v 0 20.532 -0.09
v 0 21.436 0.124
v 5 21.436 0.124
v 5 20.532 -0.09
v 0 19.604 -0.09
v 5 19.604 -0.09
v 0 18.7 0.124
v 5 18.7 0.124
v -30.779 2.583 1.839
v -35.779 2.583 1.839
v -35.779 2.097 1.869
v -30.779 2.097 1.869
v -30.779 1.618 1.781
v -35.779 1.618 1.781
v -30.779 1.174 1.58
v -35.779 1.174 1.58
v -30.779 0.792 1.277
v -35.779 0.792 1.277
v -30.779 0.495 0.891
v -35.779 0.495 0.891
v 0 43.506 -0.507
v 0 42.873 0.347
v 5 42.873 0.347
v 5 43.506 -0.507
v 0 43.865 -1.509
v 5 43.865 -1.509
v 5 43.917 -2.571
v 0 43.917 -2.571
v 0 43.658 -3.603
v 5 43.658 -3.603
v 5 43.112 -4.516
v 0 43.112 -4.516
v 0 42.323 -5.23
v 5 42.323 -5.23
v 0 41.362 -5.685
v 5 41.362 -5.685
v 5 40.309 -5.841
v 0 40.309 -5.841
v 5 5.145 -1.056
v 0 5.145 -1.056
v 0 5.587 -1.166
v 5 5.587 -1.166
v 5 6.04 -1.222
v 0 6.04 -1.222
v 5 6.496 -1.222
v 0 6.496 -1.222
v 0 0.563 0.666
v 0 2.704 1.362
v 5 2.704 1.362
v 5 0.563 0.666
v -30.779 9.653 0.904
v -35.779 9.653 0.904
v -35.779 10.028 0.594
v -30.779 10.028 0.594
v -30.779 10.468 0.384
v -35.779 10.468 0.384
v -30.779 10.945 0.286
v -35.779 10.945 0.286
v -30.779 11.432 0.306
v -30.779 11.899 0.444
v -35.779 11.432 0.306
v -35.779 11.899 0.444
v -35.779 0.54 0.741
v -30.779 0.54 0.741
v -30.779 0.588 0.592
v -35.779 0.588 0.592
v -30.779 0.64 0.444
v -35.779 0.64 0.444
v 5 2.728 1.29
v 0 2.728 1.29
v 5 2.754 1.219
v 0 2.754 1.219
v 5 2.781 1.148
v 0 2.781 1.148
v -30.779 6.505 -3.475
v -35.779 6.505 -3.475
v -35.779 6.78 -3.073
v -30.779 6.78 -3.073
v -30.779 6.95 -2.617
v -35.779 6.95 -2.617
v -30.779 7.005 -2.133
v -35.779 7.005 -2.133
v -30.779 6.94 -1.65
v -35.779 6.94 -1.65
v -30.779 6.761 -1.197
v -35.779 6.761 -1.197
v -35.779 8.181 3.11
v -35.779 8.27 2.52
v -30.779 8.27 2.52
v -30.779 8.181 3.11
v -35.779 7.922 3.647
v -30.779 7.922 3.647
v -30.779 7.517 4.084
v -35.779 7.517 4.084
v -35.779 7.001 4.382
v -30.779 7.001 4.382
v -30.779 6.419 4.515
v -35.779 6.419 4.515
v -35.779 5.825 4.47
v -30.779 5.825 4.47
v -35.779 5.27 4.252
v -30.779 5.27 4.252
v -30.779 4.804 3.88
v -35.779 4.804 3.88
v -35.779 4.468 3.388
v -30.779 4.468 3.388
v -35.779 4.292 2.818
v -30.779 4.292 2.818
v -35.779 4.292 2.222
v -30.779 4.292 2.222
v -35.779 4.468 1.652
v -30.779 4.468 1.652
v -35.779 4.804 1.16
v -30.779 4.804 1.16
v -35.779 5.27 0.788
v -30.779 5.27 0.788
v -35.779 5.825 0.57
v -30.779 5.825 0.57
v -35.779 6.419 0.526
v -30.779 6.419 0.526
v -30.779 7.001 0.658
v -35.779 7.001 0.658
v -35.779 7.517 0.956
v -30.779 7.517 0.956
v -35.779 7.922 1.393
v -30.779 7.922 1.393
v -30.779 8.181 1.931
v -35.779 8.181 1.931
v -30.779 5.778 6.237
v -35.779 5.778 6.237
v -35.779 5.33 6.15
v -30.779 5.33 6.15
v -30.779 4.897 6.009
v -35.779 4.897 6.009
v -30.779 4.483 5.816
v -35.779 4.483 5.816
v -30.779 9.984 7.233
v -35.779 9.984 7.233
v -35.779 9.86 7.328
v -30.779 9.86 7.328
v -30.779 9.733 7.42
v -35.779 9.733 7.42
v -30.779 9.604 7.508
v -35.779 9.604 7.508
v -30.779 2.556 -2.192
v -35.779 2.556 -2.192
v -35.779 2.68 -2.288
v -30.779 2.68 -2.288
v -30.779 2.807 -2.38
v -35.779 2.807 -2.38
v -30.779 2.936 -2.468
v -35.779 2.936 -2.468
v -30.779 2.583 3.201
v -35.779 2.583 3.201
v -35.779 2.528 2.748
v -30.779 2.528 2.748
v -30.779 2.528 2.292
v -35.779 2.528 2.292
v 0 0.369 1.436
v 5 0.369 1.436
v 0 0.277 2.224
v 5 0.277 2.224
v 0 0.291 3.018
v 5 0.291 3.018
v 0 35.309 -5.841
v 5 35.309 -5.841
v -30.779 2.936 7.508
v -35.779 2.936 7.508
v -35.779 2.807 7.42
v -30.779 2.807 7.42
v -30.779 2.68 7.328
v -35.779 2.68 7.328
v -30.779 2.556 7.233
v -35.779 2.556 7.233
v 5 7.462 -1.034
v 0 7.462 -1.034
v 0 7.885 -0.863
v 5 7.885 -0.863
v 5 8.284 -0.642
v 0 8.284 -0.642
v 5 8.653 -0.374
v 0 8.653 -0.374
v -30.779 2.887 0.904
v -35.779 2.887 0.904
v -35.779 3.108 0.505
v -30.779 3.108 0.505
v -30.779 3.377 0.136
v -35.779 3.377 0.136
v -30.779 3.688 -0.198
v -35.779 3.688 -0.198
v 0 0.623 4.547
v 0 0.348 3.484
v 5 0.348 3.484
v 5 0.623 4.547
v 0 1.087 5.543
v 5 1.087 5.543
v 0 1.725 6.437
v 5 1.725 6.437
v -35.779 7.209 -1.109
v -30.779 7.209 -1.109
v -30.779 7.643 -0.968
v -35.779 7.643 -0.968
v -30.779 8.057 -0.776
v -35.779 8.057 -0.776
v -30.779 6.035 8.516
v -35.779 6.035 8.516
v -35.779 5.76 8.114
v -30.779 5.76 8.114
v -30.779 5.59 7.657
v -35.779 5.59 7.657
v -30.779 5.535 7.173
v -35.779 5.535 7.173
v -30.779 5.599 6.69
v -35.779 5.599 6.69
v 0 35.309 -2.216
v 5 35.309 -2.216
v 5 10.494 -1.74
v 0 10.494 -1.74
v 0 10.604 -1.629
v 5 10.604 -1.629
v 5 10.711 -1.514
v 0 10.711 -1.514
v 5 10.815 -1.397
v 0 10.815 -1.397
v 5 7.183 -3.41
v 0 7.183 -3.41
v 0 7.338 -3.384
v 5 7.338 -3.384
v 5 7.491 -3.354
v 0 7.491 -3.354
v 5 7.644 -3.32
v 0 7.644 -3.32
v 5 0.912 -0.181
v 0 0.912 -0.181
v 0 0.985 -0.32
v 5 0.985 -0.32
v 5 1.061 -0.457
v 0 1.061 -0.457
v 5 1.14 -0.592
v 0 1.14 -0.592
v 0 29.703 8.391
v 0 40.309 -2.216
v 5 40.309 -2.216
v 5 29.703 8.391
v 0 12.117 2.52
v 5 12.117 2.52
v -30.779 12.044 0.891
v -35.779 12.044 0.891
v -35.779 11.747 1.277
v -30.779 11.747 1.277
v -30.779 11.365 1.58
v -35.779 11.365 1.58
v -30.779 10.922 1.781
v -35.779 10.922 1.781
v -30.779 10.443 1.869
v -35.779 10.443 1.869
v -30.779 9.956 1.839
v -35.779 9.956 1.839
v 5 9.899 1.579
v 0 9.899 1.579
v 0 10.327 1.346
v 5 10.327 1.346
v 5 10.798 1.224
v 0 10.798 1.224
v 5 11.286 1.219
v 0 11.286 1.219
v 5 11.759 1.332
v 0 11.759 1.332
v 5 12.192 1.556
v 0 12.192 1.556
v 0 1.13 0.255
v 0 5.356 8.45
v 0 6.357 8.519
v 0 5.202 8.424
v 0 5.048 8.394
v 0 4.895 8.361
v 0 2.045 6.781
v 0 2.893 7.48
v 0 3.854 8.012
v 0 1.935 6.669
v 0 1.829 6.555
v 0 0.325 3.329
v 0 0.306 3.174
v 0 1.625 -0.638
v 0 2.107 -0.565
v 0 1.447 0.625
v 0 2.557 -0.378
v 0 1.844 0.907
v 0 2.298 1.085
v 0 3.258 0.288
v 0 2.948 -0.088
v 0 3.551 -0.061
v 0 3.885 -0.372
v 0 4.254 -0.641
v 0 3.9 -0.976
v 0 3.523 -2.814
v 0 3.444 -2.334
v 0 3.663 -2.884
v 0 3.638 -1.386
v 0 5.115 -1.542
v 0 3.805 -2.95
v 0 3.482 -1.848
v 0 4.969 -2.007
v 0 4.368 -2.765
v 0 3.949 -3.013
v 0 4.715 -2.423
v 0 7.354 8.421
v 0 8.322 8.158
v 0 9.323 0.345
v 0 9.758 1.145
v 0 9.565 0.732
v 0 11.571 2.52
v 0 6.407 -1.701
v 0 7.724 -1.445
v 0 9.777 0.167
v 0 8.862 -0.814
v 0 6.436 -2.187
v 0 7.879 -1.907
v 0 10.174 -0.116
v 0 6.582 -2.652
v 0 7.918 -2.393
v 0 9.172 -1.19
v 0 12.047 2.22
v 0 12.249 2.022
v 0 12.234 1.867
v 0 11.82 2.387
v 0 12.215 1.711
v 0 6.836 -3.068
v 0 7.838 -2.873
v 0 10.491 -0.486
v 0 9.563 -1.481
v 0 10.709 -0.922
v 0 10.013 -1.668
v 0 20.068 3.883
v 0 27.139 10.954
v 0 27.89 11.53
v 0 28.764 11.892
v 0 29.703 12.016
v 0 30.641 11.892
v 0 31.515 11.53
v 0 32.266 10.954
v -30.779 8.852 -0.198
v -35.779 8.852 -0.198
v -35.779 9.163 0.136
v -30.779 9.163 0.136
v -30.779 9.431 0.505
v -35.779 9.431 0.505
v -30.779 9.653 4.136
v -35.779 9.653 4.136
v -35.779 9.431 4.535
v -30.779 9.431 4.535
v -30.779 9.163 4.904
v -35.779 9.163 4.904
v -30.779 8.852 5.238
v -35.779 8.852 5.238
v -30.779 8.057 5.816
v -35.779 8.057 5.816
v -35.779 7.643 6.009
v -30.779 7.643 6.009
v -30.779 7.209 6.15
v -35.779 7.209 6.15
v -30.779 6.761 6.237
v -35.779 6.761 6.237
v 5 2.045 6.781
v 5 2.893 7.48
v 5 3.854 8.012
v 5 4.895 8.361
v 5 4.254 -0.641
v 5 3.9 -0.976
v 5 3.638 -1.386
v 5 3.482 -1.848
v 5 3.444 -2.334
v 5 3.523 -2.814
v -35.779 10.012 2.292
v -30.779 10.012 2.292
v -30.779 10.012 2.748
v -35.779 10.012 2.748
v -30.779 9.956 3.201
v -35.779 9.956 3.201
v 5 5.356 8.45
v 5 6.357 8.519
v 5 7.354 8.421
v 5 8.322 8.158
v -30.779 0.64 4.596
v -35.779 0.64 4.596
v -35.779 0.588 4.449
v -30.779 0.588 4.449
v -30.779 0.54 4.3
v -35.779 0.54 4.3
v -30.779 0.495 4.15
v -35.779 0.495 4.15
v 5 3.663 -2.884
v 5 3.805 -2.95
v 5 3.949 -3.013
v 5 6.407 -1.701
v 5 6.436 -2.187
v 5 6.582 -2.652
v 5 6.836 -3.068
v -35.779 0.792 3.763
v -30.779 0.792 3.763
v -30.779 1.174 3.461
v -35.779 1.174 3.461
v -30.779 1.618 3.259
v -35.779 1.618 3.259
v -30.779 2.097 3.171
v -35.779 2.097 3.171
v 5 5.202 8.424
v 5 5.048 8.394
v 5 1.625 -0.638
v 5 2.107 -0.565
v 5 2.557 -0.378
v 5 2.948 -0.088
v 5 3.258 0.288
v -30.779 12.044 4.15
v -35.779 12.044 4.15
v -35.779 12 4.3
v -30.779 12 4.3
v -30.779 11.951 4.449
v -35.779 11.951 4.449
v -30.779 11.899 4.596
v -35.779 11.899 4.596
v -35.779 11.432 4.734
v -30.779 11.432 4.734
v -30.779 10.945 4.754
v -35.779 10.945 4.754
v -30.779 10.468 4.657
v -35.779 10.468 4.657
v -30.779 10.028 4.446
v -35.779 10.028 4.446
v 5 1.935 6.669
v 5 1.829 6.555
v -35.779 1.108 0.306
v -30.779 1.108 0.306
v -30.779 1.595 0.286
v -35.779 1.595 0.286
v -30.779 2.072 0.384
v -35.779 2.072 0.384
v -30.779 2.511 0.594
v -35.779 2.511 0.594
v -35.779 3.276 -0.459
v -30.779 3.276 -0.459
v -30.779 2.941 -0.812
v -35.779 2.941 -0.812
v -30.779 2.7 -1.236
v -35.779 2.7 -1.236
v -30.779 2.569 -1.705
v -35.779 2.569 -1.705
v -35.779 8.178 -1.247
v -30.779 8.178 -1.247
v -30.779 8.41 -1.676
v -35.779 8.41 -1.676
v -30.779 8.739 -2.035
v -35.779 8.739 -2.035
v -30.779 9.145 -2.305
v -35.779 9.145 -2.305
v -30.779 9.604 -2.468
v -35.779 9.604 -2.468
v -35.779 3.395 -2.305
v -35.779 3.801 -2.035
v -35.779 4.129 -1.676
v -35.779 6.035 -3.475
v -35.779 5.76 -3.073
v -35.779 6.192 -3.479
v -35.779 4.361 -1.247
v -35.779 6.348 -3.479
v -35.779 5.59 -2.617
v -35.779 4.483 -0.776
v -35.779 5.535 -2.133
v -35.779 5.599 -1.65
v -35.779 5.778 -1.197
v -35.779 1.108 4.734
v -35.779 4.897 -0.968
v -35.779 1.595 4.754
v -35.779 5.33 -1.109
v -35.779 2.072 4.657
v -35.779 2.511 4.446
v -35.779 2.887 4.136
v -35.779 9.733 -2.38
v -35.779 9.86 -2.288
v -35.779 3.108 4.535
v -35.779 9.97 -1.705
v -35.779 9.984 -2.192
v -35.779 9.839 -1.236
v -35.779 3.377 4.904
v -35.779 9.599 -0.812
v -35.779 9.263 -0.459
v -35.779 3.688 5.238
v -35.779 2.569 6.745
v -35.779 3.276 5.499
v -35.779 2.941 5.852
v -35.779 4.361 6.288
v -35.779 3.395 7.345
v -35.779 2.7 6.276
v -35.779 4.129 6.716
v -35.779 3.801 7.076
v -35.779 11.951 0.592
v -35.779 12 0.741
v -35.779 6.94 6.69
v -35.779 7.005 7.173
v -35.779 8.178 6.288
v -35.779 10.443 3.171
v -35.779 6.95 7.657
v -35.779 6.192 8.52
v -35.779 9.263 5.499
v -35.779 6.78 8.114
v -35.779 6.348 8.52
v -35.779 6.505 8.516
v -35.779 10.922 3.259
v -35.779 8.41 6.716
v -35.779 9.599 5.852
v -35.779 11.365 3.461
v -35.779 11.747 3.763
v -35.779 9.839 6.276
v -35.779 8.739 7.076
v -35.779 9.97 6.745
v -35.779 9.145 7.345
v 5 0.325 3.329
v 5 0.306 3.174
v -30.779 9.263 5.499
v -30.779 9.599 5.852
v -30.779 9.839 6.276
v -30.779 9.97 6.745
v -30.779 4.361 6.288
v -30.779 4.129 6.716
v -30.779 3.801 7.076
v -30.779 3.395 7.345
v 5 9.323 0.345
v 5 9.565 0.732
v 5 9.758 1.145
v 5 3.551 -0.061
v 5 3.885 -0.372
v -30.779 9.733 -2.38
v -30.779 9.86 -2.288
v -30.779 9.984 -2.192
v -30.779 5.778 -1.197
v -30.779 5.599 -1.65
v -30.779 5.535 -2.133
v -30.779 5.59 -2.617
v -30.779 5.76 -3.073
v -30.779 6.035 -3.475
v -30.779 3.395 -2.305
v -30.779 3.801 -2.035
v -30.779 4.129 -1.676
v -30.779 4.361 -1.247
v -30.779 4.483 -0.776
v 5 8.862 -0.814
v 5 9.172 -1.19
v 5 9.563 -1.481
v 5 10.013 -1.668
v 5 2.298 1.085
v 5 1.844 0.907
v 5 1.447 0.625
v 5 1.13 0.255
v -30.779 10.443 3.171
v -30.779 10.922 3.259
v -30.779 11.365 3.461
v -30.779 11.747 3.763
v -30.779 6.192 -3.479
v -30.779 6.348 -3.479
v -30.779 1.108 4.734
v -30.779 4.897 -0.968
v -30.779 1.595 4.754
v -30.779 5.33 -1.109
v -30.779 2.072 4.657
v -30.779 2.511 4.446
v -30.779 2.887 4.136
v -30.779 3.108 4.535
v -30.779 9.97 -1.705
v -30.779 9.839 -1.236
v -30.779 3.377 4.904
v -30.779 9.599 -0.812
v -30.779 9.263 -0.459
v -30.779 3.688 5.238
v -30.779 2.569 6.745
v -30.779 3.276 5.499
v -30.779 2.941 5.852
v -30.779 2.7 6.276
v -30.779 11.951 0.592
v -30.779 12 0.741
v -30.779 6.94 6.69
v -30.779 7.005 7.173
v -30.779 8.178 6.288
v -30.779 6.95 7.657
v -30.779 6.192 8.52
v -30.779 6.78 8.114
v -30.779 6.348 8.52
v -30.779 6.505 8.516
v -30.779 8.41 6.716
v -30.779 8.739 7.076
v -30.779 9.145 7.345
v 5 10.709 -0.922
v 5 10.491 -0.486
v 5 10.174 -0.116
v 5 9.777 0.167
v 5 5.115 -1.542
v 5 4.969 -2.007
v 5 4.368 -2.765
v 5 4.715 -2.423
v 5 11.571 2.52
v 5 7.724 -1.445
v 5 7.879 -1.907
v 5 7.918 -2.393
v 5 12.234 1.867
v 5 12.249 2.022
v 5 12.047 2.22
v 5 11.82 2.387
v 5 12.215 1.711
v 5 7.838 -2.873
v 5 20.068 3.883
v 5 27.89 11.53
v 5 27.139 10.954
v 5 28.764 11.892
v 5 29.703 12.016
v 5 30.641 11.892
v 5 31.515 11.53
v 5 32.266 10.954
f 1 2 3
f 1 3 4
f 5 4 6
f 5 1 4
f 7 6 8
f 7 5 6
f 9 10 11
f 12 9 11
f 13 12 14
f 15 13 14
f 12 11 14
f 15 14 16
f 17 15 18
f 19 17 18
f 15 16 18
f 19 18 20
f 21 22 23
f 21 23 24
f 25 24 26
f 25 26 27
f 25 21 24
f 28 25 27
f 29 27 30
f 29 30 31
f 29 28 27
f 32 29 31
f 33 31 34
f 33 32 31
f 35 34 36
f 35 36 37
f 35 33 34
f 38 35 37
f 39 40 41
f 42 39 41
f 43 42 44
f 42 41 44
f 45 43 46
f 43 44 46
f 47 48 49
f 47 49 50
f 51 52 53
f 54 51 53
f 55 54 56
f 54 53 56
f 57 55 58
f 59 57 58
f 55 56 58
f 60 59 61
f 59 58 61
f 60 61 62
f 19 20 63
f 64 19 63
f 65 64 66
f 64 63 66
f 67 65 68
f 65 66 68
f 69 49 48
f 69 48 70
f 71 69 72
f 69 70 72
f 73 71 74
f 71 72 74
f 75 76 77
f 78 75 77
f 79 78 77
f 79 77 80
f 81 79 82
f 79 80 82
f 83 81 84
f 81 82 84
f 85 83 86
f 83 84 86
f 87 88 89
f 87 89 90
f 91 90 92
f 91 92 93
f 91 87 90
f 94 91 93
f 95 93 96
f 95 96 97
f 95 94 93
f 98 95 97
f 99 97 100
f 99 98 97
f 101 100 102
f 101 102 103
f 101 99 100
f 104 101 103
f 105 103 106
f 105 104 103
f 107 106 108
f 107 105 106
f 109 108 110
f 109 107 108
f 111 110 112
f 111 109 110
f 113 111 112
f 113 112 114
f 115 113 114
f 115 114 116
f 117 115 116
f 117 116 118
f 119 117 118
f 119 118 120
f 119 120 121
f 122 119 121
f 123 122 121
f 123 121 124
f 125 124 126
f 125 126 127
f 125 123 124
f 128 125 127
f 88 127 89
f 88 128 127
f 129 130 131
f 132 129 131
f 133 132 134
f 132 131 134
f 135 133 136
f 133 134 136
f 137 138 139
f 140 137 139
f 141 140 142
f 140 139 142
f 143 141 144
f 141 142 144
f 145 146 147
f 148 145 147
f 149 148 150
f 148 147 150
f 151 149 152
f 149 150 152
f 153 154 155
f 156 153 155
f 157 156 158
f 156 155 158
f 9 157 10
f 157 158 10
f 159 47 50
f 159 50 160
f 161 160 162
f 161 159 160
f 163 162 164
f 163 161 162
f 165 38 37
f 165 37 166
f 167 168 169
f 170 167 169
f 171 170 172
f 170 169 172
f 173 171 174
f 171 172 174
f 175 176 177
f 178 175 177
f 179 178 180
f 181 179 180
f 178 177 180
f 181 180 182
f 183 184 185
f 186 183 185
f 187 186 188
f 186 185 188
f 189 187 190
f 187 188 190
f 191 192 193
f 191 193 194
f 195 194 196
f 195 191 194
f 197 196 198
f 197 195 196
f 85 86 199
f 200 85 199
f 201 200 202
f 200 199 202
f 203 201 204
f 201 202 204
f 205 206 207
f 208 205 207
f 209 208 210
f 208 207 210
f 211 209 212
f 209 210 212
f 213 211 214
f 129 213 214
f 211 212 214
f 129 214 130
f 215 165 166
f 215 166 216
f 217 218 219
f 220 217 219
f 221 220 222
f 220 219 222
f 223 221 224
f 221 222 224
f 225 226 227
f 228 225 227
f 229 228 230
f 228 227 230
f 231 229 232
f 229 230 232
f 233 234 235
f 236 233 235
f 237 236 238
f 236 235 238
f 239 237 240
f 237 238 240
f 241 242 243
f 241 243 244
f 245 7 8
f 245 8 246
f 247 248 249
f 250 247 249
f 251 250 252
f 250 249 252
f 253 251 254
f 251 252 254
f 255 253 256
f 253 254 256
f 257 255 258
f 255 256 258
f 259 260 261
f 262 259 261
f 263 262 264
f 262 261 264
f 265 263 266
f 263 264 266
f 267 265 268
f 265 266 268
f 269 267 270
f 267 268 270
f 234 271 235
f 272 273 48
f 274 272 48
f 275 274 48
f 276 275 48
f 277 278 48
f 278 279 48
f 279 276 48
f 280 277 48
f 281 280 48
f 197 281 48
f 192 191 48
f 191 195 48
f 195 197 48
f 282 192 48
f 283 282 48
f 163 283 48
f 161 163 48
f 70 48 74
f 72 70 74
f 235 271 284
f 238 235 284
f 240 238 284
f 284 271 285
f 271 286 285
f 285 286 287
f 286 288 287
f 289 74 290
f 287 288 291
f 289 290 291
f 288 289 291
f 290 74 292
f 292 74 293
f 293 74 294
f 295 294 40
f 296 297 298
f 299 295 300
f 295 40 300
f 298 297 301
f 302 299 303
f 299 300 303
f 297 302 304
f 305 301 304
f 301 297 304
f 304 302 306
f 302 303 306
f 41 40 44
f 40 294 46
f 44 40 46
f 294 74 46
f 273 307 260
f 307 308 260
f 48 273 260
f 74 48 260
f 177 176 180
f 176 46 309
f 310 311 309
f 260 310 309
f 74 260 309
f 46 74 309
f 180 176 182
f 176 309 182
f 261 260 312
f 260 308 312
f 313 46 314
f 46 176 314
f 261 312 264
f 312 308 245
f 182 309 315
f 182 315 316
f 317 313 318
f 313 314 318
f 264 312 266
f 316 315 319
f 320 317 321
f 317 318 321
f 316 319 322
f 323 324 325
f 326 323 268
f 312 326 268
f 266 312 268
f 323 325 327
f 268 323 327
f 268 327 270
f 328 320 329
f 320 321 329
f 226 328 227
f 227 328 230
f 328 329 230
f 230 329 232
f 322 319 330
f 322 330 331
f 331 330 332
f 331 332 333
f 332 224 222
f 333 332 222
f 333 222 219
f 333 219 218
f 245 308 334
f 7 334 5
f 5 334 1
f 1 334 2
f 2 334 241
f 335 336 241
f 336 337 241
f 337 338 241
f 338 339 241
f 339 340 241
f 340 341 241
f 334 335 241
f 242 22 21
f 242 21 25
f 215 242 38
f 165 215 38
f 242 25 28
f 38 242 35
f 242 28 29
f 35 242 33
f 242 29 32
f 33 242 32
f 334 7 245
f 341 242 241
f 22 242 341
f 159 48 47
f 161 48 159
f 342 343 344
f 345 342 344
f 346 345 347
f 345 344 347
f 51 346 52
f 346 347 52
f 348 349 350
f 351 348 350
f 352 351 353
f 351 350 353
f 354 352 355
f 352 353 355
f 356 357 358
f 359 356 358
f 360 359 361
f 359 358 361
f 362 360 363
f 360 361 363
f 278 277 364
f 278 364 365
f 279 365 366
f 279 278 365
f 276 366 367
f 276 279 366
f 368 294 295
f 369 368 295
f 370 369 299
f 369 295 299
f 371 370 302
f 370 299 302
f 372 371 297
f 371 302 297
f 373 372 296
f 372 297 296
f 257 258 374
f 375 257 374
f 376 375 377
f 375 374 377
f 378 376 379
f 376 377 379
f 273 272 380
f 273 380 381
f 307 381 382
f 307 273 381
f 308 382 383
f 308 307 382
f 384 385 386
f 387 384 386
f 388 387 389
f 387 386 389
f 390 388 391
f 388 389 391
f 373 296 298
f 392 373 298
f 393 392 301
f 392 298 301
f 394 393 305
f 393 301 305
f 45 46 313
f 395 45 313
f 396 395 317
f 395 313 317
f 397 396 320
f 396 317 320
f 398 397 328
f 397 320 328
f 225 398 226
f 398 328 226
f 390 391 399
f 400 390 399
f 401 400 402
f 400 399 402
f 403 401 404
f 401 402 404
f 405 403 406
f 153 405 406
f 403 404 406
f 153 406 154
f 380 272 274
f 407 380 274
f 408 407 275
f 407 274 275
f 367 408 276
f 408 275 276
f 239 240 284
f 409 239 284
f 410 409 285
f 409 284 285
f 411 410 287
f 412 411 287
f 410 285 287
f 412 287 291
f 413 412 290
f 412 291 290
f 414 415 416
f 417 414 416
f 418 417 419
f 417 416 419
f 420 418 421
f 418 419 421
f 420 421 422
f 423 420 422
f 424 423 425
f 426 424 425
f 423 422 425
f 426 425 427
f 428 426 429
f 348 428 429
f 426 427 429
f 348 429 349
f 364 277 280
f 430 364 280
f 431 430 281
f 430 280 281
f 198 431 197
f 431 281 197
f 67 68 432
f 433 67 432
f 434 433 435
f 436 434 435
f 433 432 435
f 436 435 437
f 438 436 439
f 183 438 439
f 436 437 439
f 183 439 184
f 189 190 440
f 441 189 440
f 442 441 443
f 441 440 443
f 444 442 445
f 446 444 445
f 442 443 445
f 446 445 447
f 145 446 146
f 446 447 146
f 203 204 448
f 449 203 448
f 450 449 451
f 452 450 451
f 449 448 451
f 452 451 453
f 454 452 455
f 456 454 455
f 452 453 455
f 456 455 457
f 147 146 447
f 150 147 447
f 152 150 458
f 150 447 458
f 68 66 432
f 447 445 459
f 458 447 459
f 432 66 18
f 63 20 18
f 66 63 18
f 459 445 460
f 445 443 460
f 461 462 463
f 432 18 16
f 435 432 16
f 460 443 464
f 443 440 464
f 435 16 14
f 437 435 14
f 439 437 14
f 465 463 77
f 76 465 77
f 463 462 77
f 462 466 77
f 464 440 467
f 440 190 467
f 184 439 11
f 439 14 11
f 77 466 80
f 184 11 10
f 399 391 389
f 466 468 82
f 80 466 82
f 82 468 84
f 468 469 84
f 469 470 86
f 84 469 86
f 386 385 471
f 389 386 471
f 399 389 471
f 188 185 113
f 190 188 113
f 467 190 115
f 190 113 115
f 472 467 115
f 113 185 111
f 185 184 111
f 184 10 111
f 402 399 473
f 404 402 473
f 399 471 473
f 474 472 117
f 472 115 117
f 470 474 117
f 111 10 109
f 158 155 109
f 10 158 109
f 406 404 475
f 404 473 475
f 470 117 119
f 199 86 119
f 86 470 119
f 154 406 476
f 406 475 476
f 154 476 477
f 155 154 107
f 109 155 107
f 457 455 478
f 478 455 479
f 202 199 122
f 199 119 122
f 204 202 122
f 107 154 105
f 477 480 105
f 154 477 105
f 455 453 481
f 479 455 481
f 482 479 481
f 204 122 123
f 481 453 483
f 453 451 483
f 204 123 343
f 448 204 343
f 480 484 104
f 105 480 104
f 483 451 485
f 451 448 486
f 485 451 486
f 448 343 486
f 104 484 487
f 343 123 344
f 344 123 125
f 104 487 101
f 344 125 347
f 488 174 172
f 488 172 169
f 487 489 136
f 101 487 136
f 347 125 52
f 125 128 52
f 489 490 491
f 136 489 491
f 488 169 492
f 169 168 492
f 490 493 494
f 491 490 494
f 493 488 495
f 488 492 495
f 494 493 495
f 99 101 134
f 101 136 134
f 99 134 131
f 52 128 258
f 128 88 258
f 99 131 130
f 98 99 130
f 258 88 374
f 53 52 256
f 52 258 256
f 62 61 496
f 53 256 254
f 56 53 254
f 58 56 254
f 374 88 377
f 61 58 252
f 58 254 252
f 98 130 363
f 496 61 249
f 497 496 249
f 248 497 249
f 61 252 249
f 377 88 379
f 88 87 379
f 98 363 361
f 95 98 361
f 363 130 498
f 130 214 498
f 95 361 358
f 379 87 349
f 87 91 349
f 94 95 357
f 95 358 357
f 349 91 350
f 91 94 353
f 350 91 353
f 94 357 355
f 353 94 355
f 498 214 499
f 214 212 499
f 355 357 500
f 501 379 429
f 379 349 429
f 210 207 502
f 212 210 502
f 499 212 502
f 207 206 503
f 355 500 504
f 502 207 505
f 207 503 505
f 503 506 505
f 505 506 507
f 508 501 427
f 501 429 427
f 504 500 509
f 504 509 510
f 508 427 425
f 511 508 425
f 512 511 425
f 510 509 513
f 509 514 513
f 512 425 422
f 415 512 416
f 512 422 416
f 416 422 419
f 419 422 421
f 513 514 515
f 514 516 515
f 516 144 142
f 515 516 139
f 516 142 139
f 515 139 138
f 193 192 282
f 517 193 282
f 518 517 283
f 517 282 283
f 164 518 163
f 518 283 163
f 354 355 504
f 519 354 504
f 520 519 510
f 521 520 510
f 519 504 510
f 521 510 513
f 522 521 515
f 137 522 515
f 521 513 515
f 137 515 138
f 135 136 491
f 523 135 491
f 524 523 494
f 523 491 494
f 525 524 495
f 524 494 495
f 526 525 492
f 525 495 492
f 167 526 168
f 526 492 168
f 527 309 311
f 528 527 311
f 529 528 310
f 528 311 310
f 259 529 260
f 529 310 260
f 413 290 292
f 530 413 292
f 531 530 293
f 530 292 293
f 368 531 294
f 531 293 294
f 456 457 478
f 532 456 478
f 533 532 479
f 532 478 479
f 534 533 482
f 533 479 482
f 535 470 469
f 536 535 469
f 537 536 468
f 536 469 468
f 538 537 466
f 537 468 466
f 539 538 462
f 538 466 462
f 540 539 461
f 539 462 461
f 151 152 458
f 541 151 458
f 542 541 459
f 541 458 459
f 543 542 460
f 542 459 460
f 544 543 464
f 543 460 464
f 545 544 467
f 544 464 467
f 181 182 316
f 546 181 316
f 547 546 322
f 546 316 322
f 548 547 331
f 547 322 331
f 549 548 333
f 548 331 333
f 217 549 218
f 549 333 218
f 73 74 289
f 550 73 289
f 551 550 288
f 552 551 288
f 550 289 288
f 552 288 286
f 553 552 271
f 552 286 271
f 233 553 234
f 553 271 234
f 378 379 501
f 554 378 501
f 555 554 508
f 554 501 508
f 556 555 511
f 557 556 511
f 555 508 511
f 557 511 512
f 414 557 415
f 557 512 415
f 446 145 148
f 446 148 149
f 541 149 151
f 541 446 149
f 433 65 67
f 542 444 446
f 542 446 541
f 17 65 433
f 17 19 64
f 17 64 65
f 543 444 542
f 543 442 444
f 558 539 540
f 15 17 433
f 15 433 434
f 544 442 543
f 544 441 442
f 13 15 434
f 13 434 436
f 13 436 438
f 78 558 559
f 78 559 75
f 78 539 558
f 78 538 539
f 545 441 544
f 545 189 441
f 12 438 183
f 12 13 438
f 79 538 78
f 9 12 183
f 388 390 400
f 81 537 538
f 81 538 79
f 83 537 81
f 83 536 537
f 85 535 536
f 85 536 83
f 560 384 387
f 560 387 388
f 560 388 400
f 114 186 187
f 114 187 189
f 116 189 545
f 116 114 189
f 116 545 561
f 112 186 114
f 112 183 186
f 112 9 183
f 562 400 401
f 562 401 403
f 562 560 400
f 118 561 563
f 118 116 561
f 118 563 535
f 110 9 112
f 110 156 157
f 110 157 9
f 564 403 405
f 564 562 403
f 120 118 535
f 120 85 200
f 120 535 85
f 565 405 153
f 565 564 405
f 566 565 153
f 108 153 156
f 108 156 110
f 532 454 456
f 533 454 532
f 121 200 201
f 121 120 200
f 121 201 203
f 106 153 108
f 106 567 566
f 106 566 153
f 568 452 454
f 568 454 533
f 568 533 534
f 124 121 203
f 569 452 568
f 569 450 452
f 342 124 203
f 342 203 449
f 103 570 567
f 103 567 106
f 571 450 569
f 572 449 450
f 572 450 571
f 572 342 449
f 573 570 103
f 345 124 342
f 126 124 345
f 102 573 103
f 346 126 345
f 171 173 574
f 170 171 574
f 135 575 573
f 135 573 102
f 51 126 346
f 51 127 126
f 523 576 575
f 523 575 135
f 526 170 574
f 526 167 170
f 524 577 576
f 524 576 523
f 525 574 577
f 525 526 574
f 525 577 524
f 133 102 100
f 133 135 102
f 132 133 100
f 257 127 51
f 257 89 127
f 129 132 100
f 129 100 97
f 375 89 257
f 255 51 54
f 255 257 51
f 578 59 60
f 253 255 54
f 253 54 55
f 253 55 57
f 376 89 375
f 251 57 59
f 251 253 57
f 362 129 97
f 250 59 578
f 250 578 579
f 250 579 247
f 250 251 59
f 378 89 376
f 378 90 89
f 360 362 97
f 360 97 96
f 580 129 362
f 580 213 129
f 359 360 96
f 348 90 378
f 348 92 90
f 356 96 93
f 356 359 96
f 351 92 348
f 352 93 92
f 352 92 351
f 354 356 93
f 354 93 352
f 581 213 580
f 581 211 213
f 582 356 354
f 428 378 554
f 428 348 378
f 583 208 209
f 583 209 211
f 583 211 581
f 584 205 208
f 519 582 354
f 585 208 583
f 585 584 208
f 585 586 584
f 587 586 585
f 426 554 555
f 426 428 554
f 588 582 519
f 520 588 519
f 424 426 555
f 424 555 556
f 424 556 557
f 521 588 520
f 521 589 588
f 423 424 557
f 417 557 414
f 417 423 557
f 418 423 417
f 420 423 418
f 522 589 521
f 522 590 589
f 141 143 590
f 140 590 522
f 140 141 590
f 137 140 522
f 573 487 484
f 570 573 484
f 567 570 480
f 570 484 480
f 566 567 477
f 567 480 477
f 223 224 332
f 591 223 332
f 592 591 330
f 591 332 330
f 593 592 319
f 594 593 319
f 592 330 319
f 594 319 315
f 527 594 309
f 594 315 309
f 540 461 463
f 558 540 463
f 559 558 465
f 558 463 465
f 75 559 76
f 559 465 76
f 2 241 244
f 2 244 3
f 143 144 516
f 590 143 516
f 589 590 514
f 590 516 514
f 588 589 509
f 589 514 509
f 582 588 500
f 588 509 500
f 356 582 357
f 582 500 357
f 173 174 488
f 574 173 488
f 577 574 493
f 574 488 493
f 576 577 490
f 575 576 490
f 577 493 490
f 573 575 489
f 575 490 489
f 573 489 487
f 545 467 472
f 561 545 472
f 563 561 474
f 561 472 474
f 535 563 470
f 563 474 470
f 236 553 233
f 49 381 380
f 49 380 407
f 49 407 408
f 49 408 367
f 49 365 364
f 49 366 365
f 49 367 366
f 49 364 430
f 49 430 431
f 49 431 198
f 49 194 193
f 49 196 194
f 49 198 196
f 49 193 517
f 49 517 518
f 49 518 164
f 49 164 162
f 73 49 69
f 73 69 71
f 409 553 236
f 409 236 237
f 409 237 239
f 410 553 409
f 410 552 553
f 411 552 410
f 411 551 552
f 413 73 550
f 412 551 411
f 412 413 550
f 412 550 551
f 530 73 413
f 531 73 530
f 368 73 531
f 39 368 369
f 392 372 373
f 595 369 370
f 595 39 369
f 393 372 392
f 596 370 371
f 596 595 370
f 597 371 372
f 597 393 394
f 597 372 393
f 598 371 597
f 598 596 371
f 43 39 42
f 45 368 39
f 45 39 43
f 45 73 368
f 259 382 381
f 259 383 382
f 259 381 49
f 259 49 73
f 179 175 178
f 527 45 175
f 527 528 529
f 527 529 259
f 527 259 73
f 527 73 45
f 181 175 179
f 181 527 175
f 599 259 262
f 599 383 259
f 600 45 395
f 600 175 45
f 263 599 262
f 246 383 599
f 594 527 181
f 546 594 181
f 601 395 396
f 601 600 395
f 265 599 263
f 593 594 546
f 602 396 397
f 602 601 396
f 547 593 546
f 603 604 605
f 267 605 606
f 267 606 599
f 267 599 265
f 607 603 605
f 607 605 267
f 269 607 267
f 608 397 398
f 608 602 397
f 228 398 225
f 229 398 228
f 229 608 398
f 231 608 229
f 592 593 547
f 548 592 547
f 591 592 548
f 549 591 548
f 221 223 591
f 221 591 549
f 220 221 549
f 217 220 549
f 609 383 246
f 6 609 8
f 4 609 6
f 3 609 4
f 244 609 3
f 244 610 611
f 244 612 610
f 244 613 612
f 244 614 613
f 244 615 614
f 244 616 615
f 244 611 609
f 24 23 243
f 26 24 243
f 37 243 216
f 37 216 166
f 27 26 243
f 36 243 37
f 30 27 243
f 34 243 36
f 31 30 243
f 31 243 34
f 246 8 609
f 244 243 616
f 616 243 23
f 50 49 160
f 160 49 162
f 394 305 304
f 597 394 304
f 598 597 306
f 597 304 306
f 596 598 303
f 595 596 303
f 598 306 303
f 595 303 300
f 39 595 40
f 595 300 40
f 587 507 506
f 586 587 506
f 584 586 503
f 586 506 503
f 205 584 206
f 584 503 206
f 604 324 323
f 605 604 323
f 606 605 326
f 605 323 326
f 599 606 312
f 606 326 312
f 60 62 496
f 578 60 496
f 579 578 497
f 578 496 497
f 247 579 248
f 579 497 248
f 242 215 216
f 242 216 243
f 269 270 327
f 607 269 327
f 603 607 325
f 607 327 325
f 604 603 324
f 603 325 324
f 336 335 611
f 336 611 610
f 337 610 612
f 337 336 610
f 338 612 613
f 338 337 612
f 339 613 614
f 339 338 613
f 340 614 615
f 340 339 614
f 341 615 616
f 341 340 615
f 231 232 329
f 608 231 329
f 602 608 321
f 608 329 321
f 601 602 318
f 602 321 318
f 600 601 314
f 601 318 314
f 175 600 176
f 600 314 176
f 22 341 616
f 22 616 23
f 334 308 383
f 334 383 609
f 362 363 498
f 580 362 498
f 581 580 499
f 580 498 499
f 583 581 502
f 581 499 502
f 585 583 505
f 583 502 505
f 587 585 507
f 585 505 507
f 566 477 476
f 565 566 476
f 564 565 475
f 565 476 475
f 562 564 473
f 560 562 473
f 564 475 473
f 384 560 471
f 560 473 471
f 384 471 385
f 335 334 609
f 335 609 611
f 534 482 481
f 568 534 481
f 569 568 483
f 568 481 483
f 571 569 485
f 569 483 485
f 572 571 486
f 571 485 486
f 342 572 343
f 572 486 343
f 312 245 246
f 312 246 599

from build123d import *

# Parameters (mm, degrees)
SPUR_START             = -35.779405604
SPUR_GEAR_AM_OUTLINE_R = 2
SPUR_GEAR_AM_DEPTH     = 5
BOSS_EXTRUDE1_DEPTH    = 5
CUT_EXTRUDE1_START     = -5
SKETCH2_R              = 2
CUT_EXTRUDE1_DEPTH     = 5
BOSS_EXTRUDE4_START    = -5
BOSS_EXTRUDE4_DEPTH    = 5


# Read off the part's stored shape, not the designer's step: spur gear_am
with BuildPart() as part:
    # spur gear_am outline → spur gear_am (new body)
    with BuildSketch(Plane.YZ.offset(SPUR_START)):
        with BuildLine():
            ThreePointArc((6.035064372, -3.475290544), (6.269831909, -3.479885286), (6.504599445, -3.475290544))
            ThreePointArc((6.504599445, -3.475290544), (6.992060826, -2.376369483), (6.761446014, -1.196512329))
            ThreePointArc((6.761446014, -1.196512329), (7.42833662, -1.045396166), (8.056686306, -0.775663247))
            ThreePointArc((8.056686306, -0.775663247), (8.56361764, -1.865739721), (9.603911774, -2.468262924))
            ThreePointArc((9.603911774, -2.468262924), (9.796543422, -2.333987253), (9.983773627, -2.192277133))
            ThreePointArc((9.983773627, -2.192277133), (9.732208576, -1.016708708), (8.852134639, -0.197736204))
            ThreePointArc((8.852134639, -0.197736204), (9.302836621, 0.316507803), (9.652637162, 0.904060997))
            ThreePointArc((9.652637162, 0.904060997), (10.703484101, 0.320137366), (11.899253988, 0.444155406))
            ThreePointArc((11.899253988, 0.444155406), (11.976171006, 0.666012748), (12.044348305, 0.890709796))
            ThreePointArc((12.044348305, 0.890709796), (11.14984612, 1.693898402), (9.956471389, 1.839166595))
            ThreePointArc((9.956471389, 1.839166595), (10.018831909, 2.520114714), (9.956471389, 3.201062833))
            ThreePointArc((9.956471389, 3.201062833), (11.14984612, 3.346331025), (12.044348305, 4.149519631))
            ThreePointArc((12.044348305, 4.149519631), (11.976171006, 4.37421668), (11.899253988, 4.596074022))
            ThreePointArc((11.899253988, 4.596074022), (10.703484101, 4.720092061), (9.652637162, 4.13616843))
            ThreePointArc((9.652637162, 4.13616843), (9.302836621, 4.723721624), (8.852134639, 5.237965631))
            ThreePointArc((8.852134639, 5.237965631), (9.732208576, 6.056938135), (9.983773627, 7.23250656))
            ThreePointArc((9.983773627, 7.23250656), (9.796543422, 7.37421668), (9.603911774, 7.508492351))
            ThreePointArc((9.603911774, 7.508492351), (8.56361764, 6.905969148), (8.056686306, 5.815892674))
            ThreePointArc((8.056686306, 5.815892674), (7.42833662, 6.085625593), (6.761446014, 6.236741756))
            ThreePointArc((6.761446014, 6.236741756), (6.992060826, 7.41659891), (6.504599445, 8.515519971))
            ThreePointArc((6.504599445, 8.515519971), (6.269831909, 8.520114714), (6.035064372, 8.515519971))
            ThreePointArc((6.035064372, 8.515519971), (5.547602991, 7.41659891), (5.778217803, 6.236741756))
            ThreePointArc((5.778217803, 6.236741756), (5.111327197, 6.085625593), (4.482977511, 5.815892674))
            ThreePointArc((4.482977511, 5.815892674), (3.976046178, 6.905969148), (2.935752043, 7.508492351))
            ThreePointArc((2.935752043, 7.508492351), (2.743120395, 7.37421668), (2.55589019, 7.23250656))
            ThreePointArc((2.55589019, 7.23250656), (2.807455242, 6.056938135), (3.687529179, 5.237965631))
            ThreePointArc((3.687529179, 5.237965631), (3.236827197, 4.723721624), (2.887026655, 4.13616843))
            ThreePointArc((2.887026655, 4.13616843), (1.836179716, 4.720092061), (0.640409829, 4.596074022))
            ThreePointArc((0.640409829, 4.596074022), (0.563492811, 4.37421668), (0.495315512, 4.149519631))
            ThreePointArc((0.495315512, 4.149519631), (1.389817697, 3.346331025), (2.583192428, 3.201062833))
            ThreePointArc((2.583192428, 3.201062833), (2.520831909, 2.520114714), (2.583192428, 1.839166595))
            ThreePointArc((2.583192428, 1.839166595), (1.389817697, 1.693898402), (0.495315512, 0.890709796))
            ThreePointArc((0.495315512, 0.890709796), (0.563492811, 0.666012748), (0.640409829, 0.444155406))
            ThreePointArc((0.640409829, 0.444155406), (1.836179716, 0.320137366), (2.887026655, 0.904060997))
            ThreePointArc((2.887026655, 0.904060997), (3.236827197, 0.316507803), (3.687529179, -0.197736204))
            ThreePointArc((3.687529179, -0.197736204), (2.807455242, -1.016708708), (2.55589019, -2.192277133))
            ThreePointArc((2.55589019, -2.192277133), (2.743120395, -2.333987253), (2.935752043, -2.468262924))
            ThreePointArc((2.935752043, -2.468262924), (3.976046178, -1.865739721), (4.482977511, -0.775663247))
            ThreePointArc((4.482977511, -0.775663247), (5.111327197, -1.045396166), (5.778217803, -1.196512329))
            ThreePointArc((5.778217803, -1.196512329), (5.547602991, -2.376369483), (6.035064372, -3.475290544))
        make_face()
        with Locations((6.269831909, 2.520114714)):
            Circle(SPUR_GEAR_AM_OUTLINE_R, mode=Mode.SUBTRACT)
    extrude(amount=SPUR_GEAR_AM_DEPTH)


with BuildPart() as body_2:
    # Sketch1 → Boss-Extrude1 (new body)
    with BuildSketch(Plane(origin=(0, 0, 0), x_dir=(0, 0, -1), z_dir=(1, 0, 0))):
        with BuildLine():
            Line((-2.520114714, 12.117440709), (-2.520114714, 6.269831909))
            Line((-2.520114714, 6.269831909), (-0.666012747, 0.563492811))
            ThreePointArc((-0.666012747, 0.563492811), (-6.836153516, 2.101881686), (-8.158270438, 8.321952769))
            Line((-8.158270438, 8.321952769), (-3.883018647, 20.068110528))
            Line((-3.883018647, 20.068110528), (-10.954086459, 27.13917834))
            ThreePointArc((-10.954086459, 27.13917834), (-12.015892078, 29.702603869), (-10.954086459, 32.266029397))
            Line((-10.954086459, 32.266029397), (-0.347484741, 42.872631115))
            ThreePointArc((-0.347484741, 42.872631115), (3.603256686, 43.658482445), (5.841171936, 40.309205586))
            Line((5.841171936, 40.309205586), (5.841171936, 35.309205586))
            Line((5.841171936, 35.309205586), (2.215940787, 35.309205586))
            Line((2.215940787, 35.309205586), (2.215940787, 40.309205586))
            Line((2.215940787, 40.309205586), (-8.39066093, 29.702603869))
            Line((-8.39066093, 29.702603869), (-0.124248164, 21.436191102))
            ThreePointArc((-0.124248164, 21.436191102), (0.116981353, 20.068110528), (-0.124248164, 18.700029955))
            Line((-0.124248164, 18.700029955), (-2.520114714, 12.117440709))
        make_face()
    extrude(amount=BOSS_EXTRUDE1_DEPTH)

    # Sketch2 → Cut-Extrude1 (cut)
    with BuildSketch(Plane(origin=(5, 0, 0), x_dir=(0, 0, -1), z_dir=(1, 0, 0)).offset(CUT_EXTRUDE1_START)):
        with Locations(Location((-2.520114714, 6.269831909, 0), (0, 0, 180))):
            Circle(SKETCH2_R)
    extrude(amount=CUT_EXTRUDE1_DEPTH, mode=Mode.SUBTRACT)

    # Sketch5 → Boss-Extrude4 (add)
    with BuildSketch(Plane(origin=(5, 0, 0), x_dir=(0, 0, -1), z_dir=(1, 0, 0)).offset(BOSS_EXTRUDE4_START)):
        with BuildLine():
            ThreePointArc((3.320342305, 7.644263358), (2.148599503, 7.913084677), (1.034423028, 7.461579551))
            ThreePointArc((1.034423028, 7.461579551), (0.758834569, 8.087383175), (0.37416263, 8.65272084))
            ThreePointArc((0.37416263, 8.65272084), (1.347484271, 9.358334814), (1.740439947, 10.494482662))
            ThreePointArc((1.740439947, 10.494482662), (1.571875447, 10.657954118), (1.397043733, 10.814704811))
            ThreePointArc((1.397043733, 10.814704811), (0.291074687, 10.343452688), (-0.344924962, 9.323280867))
            ThreePointArc((-0.344924962, 9.323280867), (-0.93571885, 9.667579802), (-1.579222127, 9.898843088))
            ThreePointArc((-1.579222127, 9.898843088), (-1.206537867, 11.041800891), (-1.556440997, 12.191937359))
            ThreePointArc((-1.556440997, 12.191937359), (-1.788898653, 12.225108819), (-2.022476226, 12.24915929))
            ThreePointArc((-2.022476226, 12.24915929), (-2.640228932, 11.217836019), (-2.555121505, 10.018668465))
            ThreePointArc((-2.555121505, 10.018668465), (-3.235457637, 9.949952219), (-3.891995873, 9.758806412))
            ThreePointArc((-3.891995873, 9.758806412), (-4.262301713, 10.90253701), (-5.221412546, 11.627349059))
            ThreePointArc((-5.221412546, 11.627349059), (-5.428972435, 11.517550152), (-5.632077174, 11.399713939))
            ThreePointArc((-5.632077174, 11.399713939), (-5.525653002, 10.202249956), (-4.751946644, 9.282127916))
            ThreePointArc((-4.751946644, 9.282127916), (-5.261959741, 8.826643761), (-5.680757645, 8.286100061))
            ThreePointArc((-5.680757645, 8.286100061), (-6.65260934, 8.99373724), (-7.854580137, 9.016371303))
            ThreePointArc((-7.854580137, 9.016371303), (-7.957961436, 8.805541479), (-8.053014233, 8.590828011))
            ThreePointArc((-8.053014233, 8.590828011), (-7.2630636, 7.684613857), (-6.096287842, 7.394992676))
            ThreePointArc((-6.096287842, 7.394992676), (-6.241170236, 6.726720077), (-6.262261243, 6.043247807))
            ThreePointArc((-6.262261243, 6.043247807), (-7.464444479, 6.044498216), (-8.450163248, 5.35630885))
            ThreePointArc((-8.450163248, 5.35630885), (-8.409877814, 5.124977936), (-8.360571733, 4.895400459))
            ThreePointArc((-8.360571733, 4.895400459), (-7.18882893, 4.62657914), (-6.074652455, 5.078084267))
            ThreePointArc((-6.074652455, 5.078084267), (-5.799063996, 4.452280642), (-5.414392057, 3.886942978))
            ThreePointArc((-5.414392057, 3.886942978), (-6.387713698, 3.181329004), (-6.780669374, 2.045181156))
            ThreePointArc((-6.780669374, 2.045181156), (-6.612104874, 1.881709699), (-6.43727316, 1.724959006))
            ThreePointArc((-6.43727316, 1.724959006), (-5.331304114, 2.196211129), (-4.695304465, 3.21638295))
            ThreePointArc((-4.695304465, 3.21638295), (-4.104510577, 2.872084015), (-3.4610073, 2.640820729))
            ThreePointArc((-3.4610073, 2.640820729), (-3.83369156, 1.497862927), (-3.48378843, 0.347726458))
            ThreePointArc((-3.48378843, 0.347726458), (-3.251330774, 0.314554999), (-3.017753201, 0.290504527))
            ThreePointArc((-3.017753201, 0.290504527), (-2.400000495, 1.321827799), (-2.485107922, 2.520995353))
            ThreePointArc((-2.485107922, 2.520995353), (-1.80477179, 2.589711598), (-1.148233554, 2.780857406))
            ThreePointArc((-1.148233554, 2.780857406), (-0.777927714, 1.637126807), (0.181183119, 0.912314758))
            ThreePointArc((0.181183119, 0.912314758), (0.388743008, 1.022113666), (0.591847747, 1.139949878))
            ThreePointArc((0.591847747, 1.139949878), (0.485423575, 2.337413862), (-0.288282783, 3.257535901))
            ThreePointArc((-0.288282783, 3.257535901), (0.221730314, 3.713020057), (0.640528217, 4.253563756))
            ThreePointArc((0.640528217, 4.253563756), (1.612379913, 3.545926577), (2.81435071, 3.523292514))
            ThreePointArc((2.81435071, 3.523292514), (2.917732009, 3.734122338), (3.012784806, 3.948835807))
            ThreePointArc((3.012784806, 3.948835807), (2.222834173, 4.855049961), (1.056058415, 5.144671141))
            ThreePointArc((1.056058415, 5.144671141), (1.200940809, 5.81294374), (1.222031815, 6.496416011))
            ThreePointArc((1.222031815, 6.496416011), (2.424215051, 6.495165601), (3.409933821, 7.183354967))
            ThreePointArc((3.409933821, 7.183354967), (3.369648387, 7.414685881), (3.320342305, 7.644263358))
        make_face()
    extrude(amount=BOSS_EXTRUDE4_DEPTH)


solid = Compound([part.part, body_2.part])
